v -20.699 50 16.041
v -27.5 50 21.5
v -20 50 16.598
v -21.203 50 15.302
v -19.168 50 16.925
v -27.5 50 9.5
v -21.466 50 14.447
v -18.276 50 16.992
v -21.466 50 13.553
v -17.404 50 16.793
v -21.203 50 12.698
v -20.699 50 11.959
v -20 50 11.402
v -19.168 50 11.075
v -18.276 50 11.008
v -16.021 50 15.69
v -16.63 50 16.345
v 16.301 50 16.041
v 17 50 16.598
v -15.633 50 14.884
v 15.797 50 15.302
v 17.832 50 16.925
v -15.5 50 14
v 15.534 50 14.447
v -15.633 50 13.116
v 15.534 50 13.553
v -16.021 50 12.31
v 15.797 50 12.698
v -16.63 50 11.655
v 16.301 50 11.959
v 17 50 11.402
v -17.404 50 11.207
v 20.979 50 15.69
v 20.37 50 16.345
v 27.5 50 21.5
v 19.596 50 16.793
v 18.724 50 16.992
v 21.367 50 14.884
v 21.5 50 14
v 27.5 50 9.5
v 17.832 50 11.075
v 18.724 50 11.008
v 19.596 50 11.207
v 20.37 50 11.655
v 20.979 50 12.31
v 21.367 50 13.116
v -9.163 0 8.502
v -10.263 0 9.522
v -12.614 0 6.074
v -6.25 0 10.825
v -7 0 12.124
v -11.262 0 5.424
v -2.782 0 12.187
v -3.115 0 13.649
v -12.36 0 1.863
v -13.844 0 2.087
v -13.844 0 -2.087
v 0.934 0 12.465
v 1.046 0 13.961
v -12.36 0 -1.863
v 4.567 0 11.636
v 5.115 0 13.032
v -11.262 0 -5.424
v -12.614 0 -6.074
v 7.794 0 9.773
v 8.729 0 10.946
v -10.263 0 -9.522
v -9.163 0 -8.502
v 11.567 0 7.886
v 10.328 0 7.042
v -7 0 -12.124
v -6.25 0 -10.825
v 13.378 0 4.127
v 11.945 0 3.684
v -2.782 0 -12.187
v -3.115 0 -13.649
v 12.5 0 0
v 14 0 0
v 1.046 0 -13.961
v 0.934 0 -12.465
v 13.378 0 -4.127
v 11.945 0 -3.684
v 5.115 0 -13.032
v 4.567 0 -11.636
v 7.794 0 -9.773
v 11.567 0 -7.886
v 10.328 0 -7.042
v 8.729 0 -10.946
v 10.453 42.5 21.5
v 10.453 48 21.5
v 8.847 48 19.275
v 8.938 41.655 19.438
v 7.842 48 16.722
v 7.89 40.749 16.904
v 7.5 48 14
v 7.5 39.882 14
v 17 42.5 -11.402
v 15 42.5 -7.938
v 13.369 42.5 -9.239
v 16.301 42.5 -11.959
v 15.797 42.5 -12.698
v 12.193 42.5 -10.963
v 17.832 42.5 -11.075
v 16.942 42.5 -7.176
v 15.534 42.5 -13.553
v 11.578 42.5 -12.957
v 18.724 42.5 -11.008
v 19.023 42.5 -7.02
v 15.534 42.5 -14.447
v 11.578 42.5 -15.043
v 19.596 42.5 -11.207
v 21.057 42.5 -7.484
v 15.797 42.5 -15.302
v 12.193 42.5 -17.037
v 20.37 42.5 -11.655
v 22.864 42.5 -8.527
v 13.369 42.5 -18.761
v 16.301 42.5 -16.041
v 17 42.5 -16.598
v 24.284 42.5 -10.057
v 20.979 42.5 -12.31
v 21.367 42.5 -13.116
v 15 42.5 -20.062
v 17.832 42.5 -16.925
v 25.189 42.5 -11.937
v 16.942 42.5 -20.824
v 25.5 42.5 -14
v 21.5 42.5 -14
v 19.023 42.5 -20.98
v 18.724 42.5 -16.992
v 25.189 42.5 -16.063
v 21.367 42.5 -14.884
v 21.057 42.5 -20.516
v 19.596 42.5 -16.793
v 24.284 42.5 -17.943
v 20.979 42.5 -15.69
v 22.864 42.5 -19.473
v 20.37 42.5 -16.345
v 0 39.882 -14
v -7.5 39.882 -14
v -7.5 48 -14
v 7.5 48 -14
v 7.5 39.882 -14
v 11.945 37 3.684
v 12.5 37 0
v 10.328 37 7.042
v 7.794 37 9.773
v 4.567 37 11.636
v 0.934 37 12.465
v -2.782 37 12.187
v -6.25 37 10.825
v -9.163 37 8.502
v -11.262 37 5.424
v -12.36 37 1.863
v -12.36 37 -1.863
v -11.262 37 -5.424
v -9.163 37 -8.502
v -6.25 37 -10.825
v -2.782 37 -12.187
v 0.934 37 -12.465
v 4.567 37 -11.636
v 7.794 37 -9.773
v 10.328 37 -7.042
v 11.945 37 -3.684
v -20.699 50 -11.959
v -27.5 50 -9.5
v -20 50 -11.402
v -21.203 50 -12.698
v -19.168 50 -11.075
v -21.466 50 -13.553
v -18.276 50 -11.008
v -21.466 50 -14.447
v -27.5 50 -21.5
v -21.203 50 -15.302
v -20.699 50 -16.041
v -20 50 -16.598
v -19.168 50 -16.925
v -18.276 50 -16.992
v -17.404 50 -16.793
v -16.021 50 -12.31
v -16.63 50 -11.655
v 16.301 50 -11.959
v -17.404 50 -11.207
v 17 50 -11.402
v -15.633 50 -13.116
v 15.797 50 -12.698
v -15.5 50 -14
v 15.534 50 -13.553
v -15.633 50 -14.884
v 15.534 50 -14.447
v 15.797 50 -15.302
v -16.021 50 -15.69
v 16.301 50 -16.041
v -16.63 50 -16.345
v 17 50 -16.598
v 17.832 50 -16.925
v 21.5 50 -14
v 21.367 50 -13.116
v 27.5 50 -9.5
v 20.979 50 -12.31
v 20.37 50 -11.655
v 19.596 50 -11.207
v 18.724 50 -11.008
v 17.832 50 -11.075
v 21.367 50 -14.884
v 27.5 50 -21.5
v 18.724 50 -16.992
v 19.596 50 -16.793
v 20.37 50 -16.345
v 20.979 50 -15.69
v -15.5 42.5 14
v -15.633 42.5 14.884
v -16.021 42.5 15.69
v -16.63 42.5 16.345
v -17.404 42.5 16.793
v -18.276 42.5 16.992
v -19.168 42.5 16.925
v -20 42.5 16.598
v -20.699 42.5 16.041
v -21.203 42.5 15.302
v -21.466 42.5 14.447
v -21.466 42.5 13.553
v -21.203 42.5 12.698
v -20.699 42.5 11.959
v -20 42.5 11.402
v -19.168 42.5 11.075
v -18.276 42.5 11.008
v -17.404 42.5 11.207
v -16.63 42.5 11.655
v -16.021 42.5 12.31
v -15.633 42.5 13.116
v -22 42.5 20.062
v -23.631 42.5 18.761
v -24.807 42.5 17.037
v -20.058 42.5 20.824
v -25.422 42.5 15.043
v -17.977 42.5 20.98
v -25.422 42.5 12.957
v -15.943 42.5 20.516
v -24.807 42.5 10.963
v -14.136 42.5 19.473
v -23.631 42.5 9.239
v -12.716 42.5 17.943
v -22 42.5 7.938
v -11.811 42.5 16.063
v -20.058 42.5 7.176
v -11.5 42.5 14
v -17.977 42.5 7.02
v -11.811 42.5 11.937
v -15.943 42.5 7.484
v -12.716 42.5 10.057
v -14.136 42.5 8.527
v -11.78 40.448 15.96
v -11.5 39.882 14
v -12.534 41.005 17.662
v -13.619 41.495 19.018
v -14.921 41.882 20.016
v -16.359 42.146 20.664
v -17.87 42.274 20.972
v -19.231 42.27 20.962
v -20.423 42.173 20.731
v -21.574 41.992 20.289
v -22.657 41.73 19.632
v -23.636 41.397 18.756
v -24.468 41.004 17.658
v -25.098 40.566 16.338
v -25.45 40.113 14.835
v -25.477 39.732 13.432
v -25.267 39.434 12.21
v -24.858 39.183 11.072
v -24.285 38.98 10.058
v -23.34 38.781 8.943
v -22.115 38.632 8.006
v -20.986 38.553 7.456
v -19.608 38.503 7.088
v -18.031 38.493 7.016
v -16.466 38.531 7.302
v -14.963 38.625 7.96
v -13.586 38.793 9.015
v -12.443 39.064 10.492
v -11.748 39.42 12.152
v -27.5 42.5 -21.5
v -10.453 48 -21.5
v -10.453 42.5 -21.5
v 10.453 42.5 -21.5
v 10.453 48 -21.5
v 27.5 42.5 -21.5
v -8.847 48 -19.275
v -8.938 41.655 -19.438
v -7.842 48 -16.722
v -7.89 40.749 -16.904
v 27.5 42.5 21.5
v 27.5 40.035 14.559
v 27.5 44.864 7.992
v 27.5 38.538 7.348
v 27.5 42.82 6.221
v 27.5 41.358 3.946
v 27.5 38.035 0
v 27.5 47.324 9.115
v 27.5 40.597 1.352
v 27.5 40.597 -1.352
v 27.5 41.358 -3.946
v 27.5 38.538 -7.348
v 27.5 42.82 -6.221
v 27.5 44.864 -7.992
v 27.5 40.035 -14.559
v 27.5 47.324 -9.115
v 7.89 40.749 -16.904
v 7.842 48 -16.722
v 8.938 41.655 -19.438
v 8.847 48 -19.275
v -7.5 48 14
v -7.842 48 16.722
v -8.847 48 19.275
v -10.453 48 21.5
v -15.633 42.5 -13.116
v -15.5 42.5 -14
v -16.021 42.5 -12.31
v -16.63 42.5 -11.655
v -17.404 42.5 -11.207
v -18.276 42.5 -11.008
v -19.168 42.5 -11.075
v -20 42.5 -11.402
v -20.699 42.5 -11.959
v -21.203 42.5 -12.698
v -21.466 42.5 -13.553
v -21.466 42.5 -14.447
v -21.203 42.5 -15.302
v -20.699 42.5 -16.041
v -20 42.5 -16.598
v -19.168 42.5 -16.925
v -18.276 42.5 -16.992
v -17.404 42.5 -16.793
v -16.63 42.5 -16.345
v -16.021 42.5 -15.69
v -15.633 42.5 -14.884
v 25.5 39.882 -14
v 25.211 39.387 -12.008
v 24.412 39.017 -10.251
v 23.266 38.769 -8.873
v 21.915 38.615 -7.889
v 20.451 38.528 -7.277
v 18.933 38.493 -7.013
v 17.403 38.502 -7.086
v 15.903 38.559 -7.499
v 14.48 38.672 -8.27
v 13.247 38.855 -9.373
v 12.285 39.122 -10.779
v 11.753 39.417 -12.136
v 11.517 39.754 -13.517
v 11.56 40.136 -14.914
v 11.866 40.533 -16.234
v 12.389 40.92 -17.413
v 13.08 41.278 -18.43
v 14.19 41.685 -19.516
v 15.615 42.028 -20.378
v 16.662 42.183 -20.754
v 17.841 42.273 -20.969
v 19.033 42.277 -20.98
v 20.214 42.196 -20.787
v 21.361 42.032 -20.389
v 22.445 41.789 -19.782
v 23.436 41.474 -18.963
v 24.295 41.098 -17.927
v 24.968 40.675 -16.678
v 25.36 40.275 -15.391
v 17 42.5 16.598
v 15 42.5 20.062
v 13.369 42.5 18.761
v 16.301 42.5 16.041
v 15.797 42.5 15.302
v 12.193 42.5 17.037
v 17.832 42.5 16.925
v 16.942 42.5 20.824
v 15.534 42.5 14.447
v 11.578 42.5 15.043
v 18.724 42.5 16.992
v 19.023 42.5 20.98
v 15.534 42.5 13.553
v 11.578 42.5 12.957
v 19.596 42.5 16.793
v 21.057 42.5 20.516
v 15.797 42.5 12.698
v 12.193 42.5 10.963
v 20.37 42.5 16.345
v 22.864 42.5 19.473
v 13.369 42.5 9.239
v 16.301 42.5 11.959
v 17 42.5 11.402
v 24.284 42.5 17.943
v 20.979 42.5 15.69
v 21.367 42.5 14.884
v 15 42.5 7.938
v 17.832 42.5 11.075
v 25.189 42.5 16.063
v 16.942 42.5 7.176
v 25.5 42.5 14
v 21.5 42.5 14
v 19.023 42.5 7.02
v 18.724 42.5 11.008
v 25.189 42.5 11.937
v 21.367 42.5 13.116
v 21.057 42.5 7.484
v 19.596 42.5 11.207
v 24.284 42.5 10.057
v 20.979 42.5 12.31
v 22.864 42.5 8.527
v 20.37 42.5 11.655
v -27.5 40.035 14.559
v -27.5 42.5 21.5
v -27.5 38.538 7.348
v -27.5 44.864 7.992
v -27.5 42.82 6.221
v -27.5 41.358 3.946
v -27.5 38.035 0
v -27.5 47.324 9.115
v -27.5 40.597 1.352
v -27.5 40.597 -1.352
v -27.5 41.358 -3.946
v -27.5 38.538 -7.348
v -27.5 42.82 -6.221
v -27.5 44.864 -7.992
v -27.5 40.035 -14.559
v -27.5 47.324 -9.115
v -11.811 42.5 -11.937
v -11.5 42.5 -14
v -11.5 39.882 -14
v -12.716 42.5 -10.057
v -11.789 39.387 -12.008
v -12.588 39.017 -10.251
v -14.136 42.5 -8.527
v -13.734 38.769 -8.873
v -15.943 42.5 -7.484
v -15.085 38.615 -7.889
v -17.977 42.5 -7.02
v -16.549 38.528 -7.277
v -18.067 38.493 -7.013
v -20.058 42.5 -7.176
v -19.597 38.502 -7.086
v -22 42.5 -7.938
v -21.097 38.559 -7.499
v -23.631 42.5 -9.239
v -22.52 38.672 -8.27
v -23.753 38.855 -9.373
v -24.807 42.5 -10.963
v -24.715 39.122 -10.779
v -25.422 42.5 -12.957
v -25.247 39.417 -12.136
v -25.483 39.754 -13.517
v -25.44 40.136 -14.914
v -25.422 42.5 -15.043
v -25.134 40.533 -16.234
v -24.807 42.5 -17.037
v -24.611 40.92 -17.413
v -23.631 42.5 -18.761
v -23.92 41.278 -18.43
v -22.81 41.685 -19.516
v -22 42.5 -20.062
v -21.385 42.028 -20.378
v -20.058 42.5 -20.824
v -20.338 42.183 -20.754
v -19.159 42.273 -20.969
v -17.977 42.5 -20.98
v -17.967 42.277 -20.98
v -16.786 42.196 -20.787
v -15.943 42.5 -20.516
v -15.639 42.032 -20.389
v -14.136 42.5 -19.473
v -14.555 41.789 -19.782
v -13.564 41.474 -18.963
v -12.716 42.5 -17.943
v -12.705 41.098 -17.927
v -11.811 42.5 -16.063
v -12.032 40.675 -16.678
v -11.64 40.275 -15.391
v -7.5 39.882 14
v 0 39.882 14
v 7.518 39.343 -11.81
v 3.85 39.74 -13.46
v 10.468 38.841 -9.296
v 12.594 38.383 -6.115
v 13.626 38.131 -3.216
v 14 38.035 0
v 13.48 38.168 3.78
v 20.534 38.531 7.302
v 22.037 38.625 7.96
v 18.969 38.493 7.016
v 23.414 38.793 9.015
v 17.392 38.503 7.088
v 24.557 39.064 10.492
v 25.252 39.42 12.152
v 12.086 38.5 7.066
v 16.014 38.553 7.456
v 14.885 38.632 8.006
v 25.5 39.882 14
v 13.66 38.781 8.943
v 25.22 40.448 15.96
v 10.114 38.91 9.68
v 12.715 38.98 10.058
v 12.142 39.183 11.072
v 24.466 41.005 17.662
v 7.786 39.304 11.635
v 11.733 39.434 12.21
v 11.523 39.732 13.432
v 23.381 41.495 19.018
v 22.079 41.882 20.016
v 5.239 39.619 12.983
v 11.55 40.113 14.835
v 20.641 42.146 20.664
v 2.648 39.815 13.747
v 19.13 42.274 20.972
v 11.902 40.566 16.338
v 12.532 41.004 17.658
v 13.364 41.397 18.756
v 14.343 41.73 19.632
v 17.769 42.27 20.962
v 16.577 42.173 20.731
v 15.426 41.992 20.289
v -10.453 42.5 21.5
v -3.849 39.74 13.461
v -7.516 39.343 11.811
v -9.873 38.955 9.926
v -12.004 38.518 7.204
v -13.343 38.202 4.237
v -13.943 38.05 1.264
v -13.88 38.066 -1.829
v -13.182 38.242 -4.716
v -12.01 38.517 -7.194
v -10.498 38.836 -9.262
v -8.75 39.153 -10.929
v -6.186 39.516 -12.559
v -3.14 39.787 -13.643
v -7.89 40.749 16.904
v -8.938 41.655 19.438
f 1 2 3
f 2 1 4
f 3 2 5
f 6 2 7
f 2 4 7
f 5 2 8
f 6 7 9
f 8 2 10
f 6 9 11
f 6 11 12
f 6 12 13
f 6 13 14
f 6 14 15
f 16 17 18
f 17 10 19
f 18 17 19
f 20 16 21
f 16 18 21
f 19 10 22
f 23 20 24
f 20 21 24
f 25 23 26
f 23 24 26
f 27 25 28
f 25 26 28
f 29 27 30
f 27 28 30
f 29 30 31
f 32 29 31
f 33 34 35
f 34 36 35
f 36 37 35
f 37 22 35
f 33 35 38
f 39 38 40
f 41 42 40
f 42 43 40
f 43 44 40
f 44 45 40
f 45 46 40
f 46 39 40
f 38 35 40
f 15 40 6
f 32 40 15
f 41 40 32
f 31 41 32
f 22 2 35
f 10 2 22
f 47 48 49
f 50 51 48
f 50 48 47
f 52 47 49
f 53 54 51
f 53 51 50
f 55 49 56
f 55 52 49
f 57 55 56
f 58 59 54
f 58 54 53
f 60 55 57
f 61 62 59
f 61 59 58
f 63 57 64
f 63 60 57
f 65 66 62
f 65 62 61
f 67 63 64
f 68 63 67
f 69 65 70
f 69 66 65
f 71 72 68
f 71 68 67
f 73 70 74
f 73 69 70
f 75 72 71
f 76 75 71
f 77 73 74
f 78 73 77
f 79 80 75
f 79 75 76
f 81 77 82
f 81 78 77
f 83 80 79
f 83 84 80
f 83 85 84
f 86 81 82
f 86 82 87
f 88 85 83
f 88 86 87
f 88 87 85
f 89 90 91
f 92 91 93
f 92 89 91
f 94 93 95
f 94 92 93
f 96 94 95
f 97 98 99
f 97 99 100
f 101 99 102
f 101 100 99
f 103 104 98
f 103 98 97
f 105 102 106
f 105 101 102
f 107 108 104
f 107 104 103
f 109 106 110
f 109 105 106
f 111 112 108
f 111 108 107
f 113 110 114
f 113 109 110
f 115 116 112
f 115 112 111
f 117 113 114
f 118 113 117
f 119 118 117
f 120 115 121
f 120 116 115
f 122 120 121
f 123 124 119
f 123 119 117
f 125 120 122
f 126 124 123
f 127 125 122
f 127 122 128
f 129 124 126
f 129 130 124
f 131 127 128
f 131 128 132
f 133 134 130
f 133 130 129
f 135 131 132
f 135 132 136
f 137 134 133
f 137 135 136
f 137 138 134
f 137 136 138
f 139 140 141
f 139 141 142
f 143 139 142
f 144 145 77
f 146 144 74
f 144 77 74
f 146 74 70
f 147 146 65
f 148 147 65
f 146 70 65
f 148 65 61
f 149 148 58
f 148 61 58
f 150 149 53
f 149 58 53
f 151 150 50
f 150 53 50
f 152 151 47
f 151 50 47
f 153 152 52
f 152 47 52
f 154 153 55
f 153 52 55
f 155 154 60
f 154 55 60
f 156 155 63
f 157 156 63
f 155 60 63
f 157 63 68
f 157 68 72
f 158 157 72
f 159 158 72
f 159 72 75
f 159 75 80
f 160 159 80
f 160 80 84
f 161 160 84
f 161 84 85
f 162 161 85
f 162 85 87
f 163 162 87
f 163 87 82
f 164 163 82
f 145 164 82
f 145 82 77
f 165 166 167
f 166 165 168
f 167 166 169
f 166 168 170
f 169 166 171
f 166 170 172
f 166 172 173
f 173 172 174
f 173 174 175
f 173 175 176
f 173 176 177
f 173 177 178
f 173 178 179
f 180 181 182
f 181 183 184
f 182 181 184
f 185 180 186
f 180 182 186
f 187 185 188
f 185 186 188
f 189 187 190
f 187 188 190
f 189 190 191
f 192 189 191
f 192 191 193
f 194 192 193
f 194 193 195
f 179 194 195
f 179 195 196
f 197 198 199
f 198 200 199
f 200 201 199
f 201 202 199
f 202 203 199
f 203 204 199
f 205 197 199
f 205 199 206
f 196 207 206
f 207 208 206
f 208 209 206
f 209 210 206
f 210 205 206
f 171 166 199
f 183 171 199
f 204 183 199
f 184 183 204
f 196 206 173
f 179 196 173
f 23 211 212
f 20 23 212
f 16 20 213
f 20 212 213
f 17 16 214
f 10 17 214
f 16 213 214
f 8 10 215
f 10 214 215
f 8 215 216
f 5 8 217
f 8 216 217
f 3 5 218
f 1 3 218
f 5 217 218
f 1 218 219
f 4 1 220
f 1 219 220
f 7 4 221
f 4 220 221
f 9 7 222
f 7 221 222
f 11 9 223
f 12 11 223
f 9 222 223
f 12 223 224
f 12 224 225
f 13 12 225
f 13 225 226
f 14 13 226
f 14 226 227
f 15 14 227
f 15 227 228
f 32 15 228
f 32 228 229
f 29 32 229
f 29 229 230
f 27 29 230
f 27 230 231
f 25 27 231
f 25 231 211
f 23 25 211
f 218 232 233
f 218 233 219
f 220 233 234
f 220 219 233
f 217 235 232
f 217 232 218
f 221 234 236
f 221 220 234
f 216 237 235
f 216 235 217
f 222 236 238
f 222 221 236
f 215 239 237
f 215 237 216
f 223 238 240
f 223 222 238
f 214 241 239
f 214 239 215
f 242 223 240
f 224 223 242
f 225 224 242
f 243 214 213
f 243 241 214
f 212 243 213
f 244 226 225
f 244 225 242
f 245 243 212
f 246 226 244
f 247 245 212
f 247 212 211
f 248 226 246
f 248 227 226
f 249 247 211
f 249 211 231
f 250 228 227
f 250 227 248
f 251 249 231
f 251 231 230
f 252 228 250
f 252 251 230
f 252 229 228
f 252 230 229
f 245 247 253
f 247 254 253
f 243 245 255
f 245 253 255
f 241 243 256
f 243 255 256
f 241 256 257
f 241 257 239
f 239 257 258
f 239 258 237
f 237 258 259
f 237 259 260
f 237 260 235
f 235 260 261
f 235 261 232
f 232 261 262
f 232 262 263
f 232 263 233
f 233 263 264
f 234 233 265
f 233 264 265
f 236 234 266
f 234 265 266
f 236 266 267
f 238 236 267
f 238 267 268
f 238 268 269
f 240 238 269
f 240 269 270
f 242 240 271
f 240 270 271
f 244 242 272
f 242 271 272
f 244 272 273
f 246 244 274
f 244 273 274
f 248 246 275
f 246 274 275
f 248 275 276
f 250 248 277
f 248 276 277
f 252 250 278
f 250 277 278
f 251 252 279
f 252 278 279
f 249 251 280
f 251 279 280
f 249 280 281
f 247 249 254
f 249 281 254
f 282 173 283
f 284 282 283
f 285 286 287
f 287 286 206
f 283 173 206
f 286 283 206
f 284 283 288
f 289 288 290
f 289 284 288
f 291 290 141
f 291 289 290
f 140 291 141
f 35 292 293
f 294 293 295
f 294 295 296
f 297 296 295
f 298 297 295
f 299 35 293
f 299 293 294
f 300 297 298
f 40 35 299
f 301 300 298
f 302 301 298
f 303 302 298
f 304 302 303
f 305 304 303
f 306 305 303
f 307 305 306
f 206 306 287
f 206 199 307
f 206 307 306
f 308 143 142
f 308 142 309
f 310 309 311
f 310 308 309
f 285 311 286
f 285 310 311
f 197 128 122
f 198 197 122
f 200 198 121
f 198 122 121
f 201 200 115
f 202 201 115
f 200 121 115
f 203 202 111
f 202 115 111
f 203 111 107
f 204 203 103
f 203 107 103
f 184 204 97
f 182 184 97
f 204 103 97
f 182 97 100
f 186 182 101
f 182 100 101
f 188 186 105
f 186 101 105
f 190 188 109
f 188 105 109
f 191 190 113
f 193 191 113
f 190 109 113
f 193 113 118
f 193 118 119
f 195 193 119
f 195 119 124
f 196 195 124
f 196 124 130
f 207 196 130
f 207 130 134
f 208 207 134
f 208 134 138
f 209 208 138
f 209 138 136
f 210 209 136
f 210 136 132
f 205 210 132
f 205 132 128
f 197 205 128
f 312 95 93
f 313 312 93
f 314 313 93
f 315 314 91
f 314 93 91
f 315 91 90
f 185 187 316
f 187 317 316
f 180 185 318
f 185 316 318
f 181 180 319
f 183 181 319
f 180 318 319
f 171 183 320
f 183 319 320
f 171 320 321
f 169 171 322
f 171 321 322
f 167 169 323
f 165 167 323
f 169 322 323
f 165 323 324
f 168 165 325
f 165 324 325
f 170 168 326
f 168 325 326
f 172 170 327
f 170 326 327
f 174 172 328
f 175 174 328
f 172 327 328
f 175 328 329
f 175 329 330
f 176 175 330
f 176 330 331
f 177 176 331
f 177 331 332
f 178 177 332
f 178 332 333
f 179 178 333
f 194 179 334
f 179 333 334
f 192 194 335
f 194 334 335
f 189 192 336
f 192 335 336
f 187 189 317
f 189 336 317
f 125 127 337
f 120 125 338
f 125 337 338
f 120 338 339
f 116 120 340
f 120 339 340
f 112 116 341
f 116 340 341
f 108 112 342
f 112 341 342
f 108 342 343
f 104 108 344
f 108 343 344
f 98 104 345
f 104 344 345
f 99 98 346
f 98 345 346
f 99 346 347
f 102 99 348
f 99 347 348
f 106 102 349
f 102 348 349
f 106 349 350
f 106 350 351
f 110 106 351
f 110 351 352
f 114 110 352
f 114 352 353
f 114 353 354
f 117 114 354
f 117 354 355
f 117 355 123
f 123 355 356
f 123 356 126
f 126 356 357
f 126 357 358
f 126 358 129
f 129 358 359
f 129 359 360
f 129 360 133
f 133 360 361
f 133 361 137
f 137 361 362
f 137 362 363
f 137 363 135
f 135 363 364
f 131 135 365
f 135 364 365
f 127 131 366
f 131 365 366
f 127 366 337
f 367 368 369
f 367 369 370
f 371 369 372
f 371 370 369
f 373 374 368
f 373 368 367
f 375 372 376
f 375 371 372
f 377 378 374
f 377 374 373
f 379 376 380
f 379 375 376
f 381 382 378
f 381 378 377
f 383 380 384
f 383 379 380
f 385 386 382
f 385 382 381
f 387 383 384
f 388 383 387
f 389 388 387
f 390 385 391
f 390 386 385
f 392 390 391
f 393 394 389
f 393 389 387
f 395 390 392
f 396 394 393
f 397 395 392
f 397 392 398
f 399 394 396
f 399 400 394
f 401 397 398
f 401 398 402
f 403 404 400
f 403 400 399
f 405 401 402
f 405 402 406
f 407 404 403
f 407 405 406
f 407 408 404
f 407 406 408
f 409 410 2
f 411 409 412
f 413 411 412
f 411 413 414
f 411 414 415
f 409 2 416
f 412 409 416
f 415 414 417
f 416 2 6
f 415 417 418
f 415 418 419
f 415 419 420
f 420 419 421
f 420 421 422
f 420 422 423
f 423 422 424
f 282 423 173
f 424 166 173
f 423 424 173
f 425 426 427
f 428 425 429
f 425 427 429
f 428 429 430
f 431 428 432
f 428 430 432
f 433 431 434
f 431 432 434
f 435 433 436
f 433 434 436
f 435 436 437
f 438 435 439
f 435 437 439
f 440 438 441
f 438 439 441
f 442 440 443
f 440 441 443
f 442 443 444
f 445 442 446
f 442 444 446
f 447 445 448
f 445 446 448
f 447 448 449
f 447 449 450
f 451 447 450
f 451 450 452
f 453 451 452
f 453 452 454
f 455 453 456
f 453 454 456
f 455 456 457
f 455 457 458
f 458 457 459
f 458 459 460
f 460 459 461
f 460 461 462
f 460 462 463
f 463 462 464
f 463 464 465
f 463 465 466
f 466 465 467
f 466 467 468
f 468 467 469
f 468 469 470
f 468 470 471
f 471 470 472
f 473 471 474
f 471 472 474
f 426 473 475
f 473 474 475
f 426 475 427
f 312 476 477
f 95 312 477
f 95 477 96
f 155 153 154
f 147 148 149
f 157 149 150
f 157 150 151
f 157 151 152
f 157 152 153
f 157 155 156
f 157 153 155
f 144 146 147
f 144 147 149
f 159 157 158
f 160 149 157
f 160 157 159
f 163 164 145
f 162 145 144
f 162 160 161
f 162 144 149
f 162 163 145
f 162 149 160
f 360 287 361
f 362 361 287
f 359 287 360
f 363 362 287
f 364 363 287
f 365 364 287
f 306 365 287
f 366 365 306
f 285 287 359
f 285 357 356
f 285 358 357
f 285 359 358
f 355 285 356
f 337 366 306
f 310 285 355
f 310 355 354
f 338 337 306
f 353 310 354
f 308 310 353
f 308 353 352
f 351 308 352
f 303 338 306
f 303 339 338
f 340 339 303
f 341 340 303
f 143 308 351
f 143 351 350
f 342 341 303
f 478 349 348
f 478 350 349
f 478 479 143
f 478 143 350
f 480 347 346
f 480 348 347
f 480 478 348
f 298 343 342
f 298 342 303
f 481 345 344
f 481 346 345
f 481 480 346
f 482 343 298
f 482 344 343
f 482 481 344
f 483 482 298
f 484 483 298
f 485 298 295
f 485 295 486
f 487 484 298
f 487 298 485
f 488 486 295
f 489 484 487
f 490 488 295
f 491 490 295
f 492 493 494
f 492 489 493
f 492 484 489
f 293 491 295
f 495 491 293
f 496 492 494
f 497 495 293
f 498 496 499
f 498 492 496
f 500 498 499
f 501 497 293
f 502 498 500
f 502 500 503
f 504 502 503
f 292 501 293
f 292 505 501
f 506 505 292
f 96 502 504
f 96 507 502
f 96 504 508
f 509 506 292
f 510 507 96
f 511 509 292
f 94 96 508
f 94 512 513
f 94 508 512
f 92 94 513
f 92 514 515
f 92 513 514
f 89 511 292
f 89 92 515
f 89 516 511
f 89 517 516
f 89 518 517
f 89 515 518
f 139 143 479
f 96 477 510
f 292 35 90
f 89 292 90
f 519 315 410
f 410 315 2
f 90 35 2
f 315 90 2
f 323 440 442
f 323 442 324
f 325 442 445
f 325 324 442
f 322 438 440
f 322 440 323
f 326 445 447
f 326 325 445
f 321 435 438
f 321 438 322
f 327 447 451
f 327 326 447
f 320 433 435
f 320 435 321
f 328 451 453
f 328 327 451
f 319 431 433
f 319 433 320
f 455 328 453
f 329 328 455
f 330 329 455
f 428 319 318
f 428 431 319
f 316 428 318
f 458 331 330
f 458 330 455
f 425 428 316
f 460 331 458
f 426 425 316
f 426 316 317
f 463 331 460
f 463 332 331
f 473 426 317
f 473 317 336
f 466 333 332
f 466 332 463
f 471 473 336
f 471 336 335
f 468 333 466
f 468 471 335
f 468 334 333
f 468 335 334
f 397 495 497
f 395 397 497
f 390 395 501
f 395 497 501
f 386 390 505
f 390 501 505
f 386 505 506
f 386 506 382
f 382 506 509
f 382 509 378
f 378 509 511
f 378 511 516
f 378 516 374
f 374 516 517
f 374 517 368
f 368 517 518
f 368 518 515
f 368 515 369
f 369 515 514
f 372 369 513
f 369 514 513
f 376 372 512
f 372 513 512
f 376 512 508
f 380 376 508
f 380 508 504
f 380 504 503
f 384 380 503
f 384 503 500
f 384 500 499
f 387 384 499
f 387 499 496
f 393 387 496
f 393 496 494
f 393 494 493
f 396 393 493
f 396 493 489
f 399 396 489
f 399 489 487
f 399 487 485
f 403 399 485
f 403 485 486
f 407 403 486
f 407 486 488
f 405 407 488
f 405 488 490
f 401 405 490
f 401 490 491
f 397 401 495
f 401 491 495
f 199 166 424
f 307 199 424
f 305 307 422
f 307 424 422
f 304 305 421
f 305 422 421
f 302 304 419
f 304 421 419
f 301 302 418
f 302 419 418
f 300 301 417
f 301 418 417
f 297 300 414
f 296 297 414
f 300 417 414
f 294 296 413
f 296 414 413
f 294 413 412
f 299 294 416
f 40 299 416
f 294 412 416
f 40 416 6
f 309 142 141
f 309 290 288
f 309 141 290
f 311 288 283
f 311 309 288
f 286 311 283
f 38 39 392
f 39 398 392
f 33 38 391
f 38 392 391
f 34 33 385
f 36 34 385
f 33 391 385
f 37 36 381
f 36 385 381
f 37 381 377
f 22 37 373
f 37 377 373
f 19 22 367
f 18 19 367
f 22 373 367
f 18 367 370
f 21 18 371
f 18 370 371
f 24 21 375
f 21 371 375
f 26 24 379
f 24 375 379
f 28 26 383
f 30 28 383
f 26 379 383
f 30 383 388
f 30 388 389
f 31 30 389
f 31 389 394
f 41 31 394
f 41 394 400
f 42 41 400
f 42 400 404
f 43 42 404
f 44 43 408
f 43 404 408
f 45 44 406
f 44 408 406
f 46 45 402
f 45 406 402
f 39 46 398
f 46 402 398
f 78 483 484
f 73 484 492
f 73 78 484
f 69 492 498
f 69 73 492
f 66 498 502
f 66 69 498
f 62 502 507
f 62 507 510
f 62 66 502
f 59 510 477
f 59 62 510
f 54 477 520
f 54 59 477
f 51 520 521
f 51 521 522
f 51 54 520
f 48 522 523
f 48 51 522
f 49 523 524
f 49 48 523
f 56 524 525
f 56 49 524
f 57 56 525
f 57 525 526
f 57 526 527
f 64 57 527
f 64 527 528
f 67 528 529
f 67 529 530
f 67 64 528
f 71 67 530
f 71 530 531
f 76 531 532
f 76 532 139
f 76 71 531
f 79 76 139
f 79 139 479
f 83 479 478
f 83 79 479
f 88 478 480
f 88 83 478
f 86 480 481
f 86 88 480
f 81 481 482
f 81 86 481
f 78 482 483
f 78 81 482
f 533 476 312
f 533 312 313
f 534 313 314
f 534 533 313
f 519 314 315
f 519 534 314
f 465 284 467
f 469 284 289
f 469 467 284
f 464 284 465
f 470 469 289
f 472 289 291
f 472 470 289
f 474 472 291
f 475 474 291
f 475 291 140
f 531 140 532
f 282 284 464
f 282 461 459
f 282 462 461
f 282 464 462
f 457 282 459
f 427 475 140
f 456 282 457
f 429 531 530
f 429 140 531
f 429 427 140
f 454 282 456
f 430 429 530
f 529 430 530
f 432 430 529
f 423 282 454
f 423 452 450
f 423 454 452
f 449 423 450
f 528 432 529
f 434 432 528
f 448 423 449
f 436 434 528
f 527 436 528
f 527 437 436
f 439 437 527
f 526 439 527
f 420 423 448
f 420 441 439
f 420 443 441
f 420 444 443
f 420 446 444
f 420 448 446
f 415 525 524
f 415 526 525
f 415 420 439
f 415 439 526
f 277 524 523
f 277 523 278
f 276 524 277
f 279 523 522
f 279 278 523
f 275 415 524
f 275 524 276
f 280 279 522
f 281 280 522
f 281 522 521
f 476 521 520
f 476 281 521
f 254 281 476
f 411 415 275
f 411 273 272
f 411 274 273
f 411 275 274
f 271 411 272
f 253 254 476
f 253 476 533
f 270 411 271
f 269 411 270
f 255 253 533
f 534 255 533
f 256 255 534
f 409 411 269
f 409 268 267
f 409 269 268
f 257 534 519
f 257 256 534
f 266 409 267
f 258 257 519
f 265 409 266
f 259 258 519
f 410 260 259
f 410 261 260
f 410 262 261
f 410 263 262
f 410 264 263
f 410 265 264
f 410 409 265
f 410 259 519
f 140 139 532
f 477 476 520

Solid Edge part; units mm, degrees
sketch "Sketch1" plane through (0, 50, 11.75) normal (0, -1, 0) x (1, 0, 0)
  line L0 (-27.5, -33.25) -> (27.5, -33.25)
  line L1 (27.5, 9.75) -> (27.5, -33.25)
  line L2 (27.5, 9.75) -> (-27.5, 9.75)
  line L3 (-27.5, 9.75) -> (-27.5, -33.25)
  dimension "D1" = 55
  dimension "D2" = 43
extrude "ExtrudedProtrusion_2" add sketch "Sketch1" along normal blind 12
sketch "Sketch2" plane through (0, 0, 0) normal (1, 0, 0) x (0, 1, 0)
  arc A0 (50, -9.5) -> (50, 9.5) centre (50, 0) cw
  line L0 (50, 9.5) -> (50, -9.5)
  dimension "D1" = 9.5
  dimension "D2" = 19
extrude "Cutout1" cut sketch "Sketch2" along normal through all and the other way through all
sketch "Sketch3" plane through (-27.5, 44, 0) normal (-1, 0, 0) x (0, 0, -1)
  line L0 (-21.5, -6) -> (-21.5, 1.5)
  arc A0 (-21.5, 1.5) -> (21.5, 1.5) centre (0, -48.0353) cw
  line L1 (21.5, -6) -> (21.5, 1.5)
  line L2 (27.9876, -6) -> (21.5, -6)
  line L3 (27.9876, 18.1819) -> (27.9876, -6)
  line L4 (-27.4197, 18.1819) -> (27.9876, 18.1819)
  line L5 (-27.4197, -6) -> (-27.4197, 18.1819)
  line L6 (-21.5, -6) -> (-27.4197, -6)
  dimension "D1" = 7.5
  dimension "D2" = 54
extrude "Cutout2" cut sketch "Sketch3" against normal up to next
sketch "Sketch4" plane through (0, 0, 0) normal (0, -1, 0) x (1, 0, 0)
  circle A0 centre (0, 0) radius 14
  dimension "D1" = 28
extrude "Protrusion1" add sketch "Sketch4" against normal up to next
sketch "Sketch5" plane through (0, 0, 0) normal (0, -1, 0) x (1, 0, 0)
  circle A0 centre (0, 0) radius 12.5
  dimension "D1" = 25
extrude "Cutout3" cut sketch "Sketch5" against normal blind 37
sketch "Sketch6" plane through (0, 38, 0) normal (0, -1, 0) x (1, 0, 0)
  circle A0 centre (-18.5, -14) radius 3
  circle A1 centre (18.5, -14) radius 3
  circle A2 centre (18.5, 14) radius 3
  circle A3 centre (-18.5, 14) radius 3
  dimension "D1" = 7.5
  dimension "D2" = 9
  dimension "D3" = 9
extrude "Cutout4" cut sketch "Sketch6" against normal through all
sketch "Sketch7" plane through (0, 38, 0) normal (0, -1, 0) x (1, 0, 0)
  circle A0 centre (-18.5, 14) radius 7
  circle A1 centre (18.5, 14) radius 7
  circle A2 centre (-18.5, -14) radius 7
  circle A3 centre (18.5, -14) radius 7
extrude "ExtrudedCutout_8" cut sketch "Sketch7" against normal blind 4.5
sketch "Sketch8" plane through (0, 38, 0) normal (0, -1, 0) x (1, 0, 0)
  arc A0 (10.4533, -21.5) -> (7.5, -14) centre (18.5, -14) cw
  line L0 (-7.5, -14) -> (7.5, -14)
  arc A1 (-10.4533, -21.5) -> (-7.5, -14) centre (-18.5, -14) ccw
  line L1 (-10.4533, -21.5) -> (10.4533, -21.5)
  line L2 (-10.4533, 21.5) -> (10.4533, 21.5)
  arc A2 (7.5, 14) -> (10.4533, 21.5) centre (18.5, 14) cw
  line L3 (-7.5, 14) -> (7.5, 14)
  arc A3 (-7.5, 14) -> (-10.4533, 21.5) centre (-18.5, 14) ccw
  dimension "D1" = 15
  dimension "D2" = 7.5
extrude "ExtrudedCutout_9" cut sketch "Sketch8" against normal blind 10
properties material "Aluminum, 1060"
